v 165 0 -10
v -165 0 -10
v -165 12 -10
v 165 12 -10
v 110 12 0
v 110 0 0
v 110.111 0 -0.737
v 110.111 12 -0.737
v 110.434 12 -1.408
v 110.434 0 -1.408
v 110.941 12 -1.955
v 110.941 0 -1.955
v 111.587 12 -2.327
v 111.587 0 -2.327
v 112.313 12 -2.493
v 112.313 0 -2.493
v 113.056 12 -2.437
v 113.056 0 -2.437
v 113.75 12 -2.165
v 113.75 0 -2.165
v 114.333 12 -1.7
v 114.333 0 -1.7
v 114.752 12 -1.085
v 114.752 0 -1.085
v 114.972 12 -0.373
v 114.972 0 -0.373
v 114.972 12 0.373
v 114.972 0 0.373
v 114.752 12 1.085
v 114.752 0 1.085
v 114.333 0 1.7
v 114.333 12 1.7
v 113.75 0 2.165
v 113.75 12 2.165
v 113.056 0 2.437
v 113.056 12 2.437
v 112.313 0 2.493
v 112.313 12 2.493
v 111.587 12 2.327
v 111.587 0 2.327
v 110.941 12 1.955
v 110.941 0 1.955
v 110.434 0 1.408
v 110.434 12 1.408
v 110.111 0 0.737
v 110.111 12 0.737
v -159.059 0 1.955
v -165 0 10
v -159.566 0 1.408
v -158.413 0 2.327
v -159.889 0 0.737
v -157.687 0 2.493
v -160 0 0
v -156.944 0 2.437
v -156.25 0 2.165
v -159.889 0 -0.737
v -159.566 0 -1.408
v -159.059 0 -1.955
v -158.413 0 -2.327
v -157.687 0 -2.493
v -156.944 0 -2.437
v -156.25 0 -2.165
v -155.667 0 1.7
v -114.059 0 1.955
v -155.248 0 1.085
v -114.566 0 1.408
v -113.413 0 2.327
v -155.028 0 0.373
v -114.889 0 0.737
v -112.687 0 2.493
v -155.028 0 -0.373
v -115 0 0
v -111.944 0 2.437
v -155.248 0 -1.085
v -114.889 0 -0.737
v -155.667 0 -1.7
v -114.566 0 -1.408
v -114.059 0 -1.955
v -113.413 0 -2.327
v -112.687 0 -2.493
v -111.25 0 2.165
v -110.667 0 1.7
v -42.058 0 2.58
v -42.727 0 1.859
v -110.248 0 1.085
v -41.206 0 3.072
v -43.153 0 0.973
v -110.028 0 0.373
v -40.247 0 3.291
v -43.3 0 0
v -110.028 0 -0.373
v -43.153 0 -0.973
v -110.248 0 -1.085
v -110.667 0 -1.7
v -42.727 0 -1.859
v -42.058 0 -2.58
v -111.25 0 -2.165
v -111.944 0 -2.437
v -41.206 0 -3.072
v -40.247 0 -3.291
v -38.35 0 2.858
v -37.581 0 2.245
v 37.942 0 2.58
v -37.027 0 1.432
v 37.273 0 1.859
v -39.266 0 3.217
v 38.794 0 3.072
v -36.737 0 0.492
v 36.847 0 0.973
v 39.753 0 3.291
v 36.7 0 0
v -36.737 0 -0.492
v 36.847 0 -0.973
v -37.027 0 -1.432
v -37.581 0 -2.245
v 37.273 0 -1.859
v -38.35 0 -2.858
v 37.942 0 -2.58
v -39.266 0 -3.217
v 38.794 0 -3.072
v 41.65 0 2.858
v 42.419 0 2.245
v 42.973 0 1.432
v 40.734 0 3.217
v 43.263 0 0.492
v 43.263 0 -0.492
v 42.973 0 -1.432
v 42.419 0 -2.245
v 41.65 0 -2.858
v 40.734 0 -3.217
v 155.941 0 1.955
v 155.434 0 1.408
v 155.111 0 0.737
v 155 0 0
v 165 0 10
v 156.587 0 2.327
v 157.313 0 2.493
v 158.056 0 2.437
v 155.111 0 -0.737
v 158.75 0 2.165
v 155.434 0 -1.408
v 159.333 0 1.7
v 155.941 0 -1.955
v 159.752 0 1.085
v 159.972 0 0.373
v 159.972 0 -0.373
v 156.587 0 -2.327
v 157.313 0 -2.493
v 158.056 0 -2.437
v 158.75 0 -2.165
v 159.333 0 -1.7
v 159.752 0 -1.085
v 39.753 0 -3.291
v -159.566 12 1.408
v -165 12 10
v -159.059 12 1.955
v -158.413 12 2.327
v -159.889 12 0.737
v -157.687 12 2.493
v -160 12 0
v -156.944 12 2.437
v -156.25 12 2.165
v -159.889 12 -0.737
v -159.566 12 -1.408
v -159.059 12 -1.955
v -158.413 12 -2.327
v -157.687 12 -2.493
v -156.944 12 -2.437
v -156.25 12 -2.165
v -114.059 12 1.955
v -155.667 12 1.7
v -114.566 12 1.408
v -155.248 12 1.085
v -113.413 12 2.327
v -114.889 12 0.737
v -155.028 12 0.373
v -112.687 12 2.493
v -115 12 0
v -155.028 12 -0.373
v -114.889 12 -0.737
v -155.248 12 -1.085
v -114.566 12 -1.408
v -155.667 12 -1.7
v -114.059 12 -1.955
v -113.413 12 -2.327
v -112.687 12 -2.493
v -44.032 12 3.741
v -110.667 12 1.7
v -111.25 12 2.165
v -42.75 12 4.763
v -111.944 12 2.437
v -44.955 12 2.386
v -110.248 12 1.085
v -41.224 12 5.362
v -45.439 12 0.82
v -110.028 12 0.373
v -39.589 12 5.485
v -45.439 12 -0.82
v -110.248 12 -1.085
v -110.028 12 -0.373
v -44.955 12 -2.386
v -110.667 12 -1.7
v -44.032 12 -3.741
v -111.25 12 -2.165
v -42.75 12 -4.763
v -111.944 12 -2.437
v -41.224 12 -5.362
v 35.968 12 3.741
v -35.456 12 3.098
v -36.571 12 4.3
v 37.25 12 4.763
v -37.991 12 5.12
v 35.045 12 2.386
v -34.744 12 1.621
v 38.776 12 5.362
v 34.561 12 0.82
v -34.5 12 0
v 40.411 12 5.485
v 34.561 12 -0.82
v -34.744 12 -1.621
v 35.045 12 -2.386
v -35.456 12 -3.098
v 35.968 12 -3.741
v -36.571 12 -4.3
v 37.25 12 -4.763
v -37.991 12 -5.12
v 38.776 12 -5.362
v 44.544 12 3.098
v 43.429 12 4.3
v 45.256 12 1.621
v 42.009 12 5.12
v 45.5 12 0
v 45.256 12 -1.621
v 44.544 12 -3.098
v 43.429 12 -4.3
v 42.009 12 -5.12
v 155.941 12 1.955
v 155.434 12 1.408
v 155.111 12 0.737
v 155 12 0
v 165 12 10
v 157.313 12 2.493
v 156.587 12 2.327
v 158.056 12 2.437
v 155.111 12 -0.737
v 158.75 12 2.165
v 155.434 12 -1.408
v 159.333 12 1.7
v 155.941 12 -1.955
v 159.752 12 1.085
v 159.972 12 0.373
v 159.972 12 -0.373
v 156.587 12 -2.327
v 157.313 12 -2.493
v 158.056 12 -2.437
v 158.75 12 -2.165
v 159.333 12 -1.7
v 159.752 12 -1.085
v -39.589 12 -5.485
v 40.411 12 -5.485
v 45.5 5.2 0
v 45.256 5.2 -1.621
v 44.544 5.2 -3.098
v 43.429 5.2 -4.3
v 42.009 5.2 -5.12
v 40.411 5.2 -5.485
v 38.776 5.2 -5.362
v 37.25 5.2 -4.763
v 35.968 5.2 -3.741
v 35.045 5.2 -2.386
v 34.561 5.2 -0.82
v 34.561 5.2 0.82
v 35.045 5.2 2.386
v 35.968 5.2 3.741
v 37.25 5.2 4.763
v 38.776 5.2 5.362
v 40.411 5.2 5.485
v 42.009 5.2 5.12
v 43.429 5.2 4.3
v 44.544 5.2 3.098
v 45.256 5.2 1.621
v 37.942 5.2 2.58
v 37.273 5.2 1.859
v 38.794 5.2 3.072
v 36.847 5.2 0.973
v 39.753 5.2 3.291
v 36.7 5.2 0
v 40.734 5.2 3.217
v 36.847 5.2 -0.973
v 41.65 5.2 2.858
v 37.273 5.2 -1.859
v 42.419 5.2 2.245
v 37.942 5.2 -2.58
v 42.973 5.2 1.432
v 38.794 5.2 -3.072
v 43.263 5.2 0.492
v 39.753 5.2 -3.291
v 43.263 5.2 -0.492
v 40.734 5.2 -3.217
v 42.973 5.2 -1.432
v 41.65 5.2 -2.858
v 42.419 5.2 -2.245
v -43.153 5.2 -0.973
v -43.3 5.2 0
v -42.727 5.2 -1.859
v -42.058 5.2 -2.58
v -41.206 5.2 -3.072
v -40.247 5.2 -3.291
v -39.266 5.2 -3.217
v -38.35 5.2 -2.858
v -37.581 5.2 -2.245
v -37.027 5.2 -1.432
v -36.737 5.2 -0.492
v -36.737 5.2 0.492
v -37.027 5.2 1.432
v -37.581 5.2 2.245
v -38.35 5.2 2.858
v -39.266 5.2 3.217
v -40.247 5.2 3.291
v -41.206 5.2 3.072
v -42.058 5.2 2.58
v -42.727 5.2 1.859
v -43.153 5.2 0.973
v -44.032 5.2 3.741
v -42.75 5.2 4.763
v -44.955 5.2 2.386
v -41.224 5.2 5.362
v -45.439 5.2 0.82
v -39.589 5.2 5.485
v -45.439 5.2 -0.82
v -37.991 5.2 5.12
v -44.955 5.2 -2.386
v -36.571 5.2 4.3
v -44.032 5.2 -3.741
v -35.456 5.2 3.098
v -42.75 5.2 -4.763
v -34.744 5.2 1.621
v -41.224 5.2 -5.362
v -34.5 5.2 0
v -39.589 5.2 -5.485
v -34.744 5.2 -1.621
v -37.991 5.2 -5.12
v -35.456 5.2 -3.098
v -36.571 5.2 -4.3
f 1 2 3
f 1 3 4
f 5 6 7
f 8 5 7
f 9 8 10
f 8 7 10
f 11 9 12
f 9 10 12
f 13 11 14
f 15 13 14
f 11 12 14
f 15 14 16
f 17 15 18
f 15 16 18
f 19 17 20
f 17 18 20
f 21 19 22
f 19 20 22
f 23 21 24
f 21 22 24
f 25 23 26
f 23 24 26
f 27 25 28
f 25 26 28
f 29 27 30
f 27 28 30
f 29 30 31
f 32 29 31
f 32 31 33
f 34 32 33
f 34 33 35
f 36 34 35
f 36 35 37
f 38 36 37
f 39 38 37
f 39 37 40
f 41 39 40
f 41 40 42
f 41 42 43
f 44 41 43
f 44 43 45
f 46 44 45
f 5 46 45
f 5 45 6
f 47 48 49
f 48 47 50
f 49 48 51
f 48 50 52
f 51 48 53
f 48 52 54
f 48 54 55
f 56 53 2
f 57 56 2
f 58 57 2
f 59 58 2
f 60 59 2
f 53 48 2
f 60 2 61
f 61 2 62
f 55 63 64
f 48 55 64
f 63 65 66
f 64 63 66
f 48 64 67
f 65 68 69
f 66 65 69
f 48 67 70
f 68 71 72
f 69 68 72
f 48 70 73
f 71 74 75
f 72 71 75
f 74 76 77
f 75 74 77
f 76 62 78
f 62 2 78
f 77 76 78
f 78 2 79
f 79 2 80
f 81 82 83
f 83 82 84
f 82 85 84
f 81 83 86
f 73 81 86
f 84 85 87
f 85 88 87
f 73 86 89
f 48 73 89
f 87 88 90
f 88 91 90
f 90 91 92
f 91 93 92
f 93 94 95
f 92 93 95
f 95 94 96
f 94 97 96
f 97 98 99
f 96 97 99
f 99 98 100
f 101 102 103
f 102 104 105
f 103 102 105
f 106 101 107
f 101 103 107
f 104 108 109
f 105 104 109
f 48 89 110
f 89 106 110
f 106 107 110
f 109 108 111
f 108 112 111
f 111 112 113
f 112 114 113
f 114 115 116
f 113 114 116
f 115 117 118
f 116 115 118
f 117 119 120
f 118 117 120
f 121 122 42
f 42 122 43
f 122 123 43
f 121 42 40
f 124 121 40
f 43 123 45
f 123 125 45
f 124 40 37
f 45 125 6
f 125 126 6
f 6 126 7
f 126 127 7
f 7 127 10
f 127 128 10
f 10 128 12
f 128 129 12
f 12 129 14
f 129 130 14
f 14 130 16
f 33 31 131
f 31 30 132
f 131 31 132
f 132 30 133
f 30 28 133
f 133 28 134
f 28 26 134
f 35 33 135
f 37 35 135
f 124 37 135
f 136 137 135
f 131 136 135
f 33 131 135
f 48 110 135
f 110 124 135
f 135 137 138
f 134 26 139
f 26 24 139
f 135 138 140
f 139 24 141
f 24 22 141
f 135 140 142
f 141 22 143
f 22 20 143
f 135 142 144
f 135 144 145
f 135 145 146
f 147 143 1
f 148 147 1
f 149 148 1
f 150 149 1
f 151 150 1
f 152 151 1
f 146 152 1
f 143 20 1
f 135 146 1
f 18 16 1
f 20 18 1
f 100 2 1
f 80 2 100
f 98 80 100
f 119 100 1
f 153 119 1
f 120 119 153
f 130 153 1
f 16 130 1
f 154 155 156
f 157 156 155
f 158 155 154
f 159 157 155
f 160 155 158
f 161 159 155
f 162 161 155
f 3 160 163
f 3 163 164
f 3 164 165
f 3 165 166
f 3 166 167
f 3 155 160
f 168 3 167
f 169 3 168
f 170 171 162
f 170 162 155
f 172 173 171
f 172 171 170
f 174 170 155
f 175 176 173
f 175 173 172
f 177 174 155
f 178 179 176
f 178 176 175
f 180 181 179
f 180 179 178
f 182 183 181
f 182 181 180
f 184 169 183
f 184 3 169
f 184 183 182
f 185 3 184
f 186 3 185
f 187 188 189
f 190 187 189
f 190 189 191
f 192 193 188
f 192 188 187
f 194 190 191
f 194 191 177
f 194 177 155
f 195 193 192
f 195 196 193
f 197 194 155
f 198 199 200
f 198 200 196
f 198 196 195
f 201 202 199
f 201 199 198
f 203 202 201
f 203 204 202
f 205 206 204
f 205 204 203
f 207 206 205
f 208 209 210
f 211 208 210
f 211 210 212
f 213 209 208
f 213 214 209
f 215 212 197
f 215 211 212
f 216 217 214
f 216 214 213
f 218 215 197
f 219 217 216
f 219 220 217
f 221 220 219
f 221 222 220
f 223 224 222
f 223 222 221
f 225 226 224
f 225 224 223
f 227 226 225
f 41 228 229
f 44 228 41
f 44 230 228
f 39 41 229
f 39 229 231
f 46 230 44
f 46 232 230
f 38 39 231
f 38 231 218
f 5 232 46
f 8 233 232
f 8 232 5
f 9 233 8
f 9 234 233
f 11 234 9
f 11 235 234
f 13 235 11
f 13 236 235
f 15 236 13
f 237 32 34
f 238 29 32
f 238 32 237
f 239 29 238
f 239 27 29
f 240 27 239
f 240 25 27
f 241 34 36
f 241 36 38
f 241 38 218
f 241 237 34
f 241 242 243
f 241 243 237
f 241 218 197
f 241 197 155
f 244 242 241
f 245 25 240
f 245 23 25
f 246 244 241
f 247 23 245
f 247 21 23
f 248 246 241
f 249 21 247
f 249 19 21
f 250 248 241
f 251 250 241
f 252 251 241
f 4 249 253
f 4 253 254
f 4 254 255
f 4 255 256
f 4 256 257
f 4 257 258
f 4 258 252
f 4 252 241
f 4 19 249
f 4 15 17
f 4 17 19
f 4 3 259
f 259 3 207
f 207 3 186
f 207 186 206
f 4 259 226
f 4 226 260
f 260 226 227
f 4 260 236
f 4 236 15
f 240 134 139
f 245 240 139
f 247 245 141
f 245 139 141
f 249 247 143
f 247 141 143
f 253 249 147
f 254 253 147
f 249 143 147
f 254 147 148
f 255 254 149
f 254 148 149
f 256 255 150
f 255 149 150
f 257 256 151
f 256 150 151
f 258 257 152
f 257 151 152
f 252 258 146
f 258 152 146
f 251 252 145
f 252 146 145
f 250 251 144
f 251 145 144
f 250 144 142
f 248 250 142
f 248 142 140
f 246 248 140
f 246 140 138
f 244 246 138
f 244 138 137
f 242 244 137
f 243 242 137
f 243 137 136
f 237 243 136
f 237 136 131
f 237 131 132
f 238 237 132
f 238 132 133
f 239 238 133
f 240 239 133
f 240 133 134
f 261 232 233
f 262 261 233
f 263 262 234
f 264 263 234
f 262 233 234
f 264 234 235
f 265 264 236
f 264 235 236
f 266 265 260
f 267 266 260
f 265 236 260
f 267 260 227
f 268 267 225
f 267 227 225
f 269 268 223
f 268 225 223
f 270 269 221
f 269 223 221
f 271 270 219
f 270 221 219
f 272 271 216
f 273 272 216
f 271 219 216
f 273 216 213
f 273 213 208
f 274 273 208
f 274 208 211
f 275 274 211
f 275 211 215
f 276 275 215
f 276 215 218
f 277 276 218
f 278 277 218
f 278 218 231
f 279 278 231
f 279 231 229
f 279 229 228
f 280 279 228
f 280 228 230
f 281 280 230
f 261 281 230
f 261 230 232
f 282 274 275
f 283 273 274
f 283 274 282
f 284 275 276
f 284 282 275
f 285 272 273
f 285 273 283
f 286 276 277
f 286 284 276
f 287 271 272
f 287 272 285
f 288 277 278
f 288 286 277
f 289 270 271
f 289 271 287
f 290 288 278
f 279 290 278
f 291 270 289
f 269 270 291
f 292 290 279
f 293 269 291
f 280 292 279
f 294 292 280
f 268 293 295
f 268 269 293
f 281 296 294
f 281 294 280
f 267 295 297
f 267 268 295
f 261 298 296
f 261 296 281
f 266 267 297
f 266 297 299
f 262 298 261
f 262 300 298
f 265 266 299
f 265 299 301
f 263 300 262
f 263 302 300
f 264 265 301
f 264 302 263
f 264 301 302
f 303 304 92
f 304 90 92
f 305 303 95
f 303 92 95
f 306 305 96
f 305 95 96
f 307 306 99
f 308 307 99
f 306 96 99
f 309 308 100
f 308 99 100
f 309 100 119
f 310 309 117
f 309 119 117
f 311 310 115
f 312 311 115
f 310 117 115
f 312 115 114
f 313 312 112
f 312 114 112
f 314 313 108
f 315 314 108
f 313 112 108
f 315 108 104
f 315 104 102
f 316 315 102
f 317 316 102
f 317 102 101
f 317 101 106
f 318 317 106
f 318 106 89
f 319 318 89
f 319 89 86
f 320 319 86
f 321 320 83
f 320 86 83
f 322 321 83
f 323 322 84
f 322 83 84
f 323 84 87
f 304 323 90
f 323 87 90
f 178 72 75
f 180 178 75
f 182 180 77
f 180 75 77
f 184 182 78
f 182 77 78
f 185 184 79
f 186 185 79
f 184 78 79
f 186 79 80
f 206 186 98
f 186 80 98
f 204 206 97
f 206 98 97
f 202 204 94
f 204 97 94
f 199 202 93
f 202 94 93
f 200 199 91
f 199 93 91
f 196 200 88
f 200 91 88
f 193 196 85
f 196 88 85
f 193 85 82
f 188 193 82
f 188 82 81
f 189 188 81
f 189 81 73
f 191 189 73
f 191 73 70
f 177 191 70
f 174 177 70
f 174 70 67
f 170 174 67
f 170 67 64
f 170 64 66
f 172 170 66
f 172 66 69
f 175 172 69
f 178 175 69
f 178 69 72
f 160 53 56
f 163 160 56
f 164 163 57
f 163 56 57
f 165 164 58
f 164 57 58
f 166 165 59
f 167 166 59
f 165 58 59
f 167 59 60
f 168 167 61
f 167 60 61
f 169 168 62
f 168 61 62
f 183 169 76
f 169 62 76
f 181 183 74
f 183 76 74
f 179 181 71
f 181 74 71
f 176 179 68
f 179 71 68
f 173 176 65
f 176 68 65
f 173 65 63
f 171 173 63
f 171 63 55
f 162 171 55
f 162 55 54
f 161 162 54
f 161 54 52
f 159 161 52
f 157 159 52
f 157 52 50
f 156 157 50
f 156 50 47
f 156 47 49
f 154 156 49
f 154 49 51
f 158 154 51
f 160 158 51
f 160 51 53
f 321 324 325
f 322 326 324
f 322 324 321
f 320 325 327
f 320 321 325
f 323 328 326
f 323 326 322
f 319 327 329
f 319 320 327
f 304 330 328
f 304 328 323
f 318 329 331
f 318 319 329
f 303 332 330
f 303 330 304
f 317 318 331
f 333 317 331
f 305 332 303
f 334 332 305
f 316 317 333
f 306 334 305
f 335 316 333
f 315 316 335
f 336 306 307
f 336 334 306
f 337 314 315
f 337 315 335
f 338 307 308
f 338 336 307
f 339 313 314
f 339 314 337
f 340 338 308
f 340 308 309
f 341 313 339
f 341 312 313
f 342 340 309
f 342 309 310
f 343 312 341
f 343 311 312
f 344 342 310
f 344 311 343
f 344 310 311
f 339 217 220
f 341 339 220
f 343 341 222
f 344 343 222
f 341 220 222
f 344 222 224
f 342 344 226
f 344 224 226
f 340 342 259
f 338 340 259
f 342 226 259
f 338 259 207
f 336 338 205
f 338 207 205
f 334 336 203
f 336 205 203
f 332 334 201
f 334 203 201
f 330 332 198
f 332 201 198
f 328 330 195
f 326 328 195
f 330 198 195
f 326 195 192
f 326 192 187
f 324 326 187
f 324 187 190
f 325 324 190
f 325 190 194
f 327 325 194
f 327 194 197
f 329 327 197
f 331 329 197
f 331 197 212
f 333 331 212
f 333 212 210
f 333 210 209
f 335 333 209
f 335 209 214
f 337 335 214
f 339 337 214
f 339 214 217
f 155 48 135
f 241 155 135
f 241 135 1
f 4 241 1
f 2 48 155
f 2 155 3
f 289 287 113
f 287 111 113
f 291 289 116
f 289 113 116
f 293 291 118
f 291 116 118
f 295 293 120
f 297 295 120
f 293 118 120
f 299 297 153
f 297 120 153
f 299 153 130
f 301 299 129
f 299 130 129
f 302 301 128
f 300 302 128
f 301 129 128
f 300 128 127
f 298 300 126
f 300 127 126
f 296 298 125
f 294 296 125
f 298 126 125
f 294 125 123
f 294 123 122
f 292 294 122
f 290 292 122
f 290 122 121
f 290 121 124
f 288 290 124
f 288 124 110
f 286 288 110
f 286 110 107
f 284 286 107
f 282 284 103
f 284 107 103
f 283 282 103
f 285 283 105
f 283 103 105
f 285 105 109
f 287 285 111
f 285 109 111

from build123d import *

# Parameters (mm, degrees)
SKETCH_1_W                = 330
SKETCH_1_H                = 20
EXTRUDE_1_DEPTH           = 12
HOLE_WIZARD_M6_1_D        = 5
HOLE_WIZARD_M6_1_DEPTH    = 15
HOLE_WIZARD_M6_1_TIP      = 1.502151548
HOLE_WIZARD_1_D           = 6.6
HOLE_WIZARD_1_CBORE_D     = 11
HOLE_WIZARD_1_CBORE_DEPTH = 6.8


with BuildPart() as part:
    # 草图1 → 凸台-拉伸1 (new body)
    with BuildSketch(Plane(origin=(0, 0, 0), x_dir=(1, 0, 0), z_dir=(0, 1, 0))):
        Rectangle(SKETCH_1_W, SKETCH_1_H)
    extrude(amount=EXTRUDE_1_DEPTH)

    # M6 螺纹孔1
    with Locations(Plane(origin=(0, 12, 0), x_dir=(1, 0, 0), z_dir=(0, 1, 0))):
        with Locations((-157.5, 0), (-112.5, 0), (112.5, 0), (157.5, 0)):
            Hole(HOLE_WIZARD_M6_1_D / 2, depth=HOLE_WIZARD_M6_1_DEPTH)
            with Locations((0, 0, -(HOLE_WIZARD_M6_1_DEPTH + HOLE_WIZARD_M6_1_TIP / 2))):  # 118° drill point
                Cone(0, HOLE_WIZARD_M6_1_D / 2, HOLE_WIZARD_M6_1_TIP, mode=Mode.SUBTRACT)

    # 打孔尺寸根据内六角圆柱头螺钉的类型1 (through all)
    with Locations(Plane(origin=(0, 12, 0), x_dir=(1, 0, 0), z_dir=(0, 1, 0))):
        with Locations((-40, 0), (40, 0)):
            CounterBoreHole(HOLE_WIZARD_1_D / 2, HOLE_WIZARD_1_CBORE_D / 2, HOLE_WIZARD_1_CBORE_DEPTH)


solid = part.part
